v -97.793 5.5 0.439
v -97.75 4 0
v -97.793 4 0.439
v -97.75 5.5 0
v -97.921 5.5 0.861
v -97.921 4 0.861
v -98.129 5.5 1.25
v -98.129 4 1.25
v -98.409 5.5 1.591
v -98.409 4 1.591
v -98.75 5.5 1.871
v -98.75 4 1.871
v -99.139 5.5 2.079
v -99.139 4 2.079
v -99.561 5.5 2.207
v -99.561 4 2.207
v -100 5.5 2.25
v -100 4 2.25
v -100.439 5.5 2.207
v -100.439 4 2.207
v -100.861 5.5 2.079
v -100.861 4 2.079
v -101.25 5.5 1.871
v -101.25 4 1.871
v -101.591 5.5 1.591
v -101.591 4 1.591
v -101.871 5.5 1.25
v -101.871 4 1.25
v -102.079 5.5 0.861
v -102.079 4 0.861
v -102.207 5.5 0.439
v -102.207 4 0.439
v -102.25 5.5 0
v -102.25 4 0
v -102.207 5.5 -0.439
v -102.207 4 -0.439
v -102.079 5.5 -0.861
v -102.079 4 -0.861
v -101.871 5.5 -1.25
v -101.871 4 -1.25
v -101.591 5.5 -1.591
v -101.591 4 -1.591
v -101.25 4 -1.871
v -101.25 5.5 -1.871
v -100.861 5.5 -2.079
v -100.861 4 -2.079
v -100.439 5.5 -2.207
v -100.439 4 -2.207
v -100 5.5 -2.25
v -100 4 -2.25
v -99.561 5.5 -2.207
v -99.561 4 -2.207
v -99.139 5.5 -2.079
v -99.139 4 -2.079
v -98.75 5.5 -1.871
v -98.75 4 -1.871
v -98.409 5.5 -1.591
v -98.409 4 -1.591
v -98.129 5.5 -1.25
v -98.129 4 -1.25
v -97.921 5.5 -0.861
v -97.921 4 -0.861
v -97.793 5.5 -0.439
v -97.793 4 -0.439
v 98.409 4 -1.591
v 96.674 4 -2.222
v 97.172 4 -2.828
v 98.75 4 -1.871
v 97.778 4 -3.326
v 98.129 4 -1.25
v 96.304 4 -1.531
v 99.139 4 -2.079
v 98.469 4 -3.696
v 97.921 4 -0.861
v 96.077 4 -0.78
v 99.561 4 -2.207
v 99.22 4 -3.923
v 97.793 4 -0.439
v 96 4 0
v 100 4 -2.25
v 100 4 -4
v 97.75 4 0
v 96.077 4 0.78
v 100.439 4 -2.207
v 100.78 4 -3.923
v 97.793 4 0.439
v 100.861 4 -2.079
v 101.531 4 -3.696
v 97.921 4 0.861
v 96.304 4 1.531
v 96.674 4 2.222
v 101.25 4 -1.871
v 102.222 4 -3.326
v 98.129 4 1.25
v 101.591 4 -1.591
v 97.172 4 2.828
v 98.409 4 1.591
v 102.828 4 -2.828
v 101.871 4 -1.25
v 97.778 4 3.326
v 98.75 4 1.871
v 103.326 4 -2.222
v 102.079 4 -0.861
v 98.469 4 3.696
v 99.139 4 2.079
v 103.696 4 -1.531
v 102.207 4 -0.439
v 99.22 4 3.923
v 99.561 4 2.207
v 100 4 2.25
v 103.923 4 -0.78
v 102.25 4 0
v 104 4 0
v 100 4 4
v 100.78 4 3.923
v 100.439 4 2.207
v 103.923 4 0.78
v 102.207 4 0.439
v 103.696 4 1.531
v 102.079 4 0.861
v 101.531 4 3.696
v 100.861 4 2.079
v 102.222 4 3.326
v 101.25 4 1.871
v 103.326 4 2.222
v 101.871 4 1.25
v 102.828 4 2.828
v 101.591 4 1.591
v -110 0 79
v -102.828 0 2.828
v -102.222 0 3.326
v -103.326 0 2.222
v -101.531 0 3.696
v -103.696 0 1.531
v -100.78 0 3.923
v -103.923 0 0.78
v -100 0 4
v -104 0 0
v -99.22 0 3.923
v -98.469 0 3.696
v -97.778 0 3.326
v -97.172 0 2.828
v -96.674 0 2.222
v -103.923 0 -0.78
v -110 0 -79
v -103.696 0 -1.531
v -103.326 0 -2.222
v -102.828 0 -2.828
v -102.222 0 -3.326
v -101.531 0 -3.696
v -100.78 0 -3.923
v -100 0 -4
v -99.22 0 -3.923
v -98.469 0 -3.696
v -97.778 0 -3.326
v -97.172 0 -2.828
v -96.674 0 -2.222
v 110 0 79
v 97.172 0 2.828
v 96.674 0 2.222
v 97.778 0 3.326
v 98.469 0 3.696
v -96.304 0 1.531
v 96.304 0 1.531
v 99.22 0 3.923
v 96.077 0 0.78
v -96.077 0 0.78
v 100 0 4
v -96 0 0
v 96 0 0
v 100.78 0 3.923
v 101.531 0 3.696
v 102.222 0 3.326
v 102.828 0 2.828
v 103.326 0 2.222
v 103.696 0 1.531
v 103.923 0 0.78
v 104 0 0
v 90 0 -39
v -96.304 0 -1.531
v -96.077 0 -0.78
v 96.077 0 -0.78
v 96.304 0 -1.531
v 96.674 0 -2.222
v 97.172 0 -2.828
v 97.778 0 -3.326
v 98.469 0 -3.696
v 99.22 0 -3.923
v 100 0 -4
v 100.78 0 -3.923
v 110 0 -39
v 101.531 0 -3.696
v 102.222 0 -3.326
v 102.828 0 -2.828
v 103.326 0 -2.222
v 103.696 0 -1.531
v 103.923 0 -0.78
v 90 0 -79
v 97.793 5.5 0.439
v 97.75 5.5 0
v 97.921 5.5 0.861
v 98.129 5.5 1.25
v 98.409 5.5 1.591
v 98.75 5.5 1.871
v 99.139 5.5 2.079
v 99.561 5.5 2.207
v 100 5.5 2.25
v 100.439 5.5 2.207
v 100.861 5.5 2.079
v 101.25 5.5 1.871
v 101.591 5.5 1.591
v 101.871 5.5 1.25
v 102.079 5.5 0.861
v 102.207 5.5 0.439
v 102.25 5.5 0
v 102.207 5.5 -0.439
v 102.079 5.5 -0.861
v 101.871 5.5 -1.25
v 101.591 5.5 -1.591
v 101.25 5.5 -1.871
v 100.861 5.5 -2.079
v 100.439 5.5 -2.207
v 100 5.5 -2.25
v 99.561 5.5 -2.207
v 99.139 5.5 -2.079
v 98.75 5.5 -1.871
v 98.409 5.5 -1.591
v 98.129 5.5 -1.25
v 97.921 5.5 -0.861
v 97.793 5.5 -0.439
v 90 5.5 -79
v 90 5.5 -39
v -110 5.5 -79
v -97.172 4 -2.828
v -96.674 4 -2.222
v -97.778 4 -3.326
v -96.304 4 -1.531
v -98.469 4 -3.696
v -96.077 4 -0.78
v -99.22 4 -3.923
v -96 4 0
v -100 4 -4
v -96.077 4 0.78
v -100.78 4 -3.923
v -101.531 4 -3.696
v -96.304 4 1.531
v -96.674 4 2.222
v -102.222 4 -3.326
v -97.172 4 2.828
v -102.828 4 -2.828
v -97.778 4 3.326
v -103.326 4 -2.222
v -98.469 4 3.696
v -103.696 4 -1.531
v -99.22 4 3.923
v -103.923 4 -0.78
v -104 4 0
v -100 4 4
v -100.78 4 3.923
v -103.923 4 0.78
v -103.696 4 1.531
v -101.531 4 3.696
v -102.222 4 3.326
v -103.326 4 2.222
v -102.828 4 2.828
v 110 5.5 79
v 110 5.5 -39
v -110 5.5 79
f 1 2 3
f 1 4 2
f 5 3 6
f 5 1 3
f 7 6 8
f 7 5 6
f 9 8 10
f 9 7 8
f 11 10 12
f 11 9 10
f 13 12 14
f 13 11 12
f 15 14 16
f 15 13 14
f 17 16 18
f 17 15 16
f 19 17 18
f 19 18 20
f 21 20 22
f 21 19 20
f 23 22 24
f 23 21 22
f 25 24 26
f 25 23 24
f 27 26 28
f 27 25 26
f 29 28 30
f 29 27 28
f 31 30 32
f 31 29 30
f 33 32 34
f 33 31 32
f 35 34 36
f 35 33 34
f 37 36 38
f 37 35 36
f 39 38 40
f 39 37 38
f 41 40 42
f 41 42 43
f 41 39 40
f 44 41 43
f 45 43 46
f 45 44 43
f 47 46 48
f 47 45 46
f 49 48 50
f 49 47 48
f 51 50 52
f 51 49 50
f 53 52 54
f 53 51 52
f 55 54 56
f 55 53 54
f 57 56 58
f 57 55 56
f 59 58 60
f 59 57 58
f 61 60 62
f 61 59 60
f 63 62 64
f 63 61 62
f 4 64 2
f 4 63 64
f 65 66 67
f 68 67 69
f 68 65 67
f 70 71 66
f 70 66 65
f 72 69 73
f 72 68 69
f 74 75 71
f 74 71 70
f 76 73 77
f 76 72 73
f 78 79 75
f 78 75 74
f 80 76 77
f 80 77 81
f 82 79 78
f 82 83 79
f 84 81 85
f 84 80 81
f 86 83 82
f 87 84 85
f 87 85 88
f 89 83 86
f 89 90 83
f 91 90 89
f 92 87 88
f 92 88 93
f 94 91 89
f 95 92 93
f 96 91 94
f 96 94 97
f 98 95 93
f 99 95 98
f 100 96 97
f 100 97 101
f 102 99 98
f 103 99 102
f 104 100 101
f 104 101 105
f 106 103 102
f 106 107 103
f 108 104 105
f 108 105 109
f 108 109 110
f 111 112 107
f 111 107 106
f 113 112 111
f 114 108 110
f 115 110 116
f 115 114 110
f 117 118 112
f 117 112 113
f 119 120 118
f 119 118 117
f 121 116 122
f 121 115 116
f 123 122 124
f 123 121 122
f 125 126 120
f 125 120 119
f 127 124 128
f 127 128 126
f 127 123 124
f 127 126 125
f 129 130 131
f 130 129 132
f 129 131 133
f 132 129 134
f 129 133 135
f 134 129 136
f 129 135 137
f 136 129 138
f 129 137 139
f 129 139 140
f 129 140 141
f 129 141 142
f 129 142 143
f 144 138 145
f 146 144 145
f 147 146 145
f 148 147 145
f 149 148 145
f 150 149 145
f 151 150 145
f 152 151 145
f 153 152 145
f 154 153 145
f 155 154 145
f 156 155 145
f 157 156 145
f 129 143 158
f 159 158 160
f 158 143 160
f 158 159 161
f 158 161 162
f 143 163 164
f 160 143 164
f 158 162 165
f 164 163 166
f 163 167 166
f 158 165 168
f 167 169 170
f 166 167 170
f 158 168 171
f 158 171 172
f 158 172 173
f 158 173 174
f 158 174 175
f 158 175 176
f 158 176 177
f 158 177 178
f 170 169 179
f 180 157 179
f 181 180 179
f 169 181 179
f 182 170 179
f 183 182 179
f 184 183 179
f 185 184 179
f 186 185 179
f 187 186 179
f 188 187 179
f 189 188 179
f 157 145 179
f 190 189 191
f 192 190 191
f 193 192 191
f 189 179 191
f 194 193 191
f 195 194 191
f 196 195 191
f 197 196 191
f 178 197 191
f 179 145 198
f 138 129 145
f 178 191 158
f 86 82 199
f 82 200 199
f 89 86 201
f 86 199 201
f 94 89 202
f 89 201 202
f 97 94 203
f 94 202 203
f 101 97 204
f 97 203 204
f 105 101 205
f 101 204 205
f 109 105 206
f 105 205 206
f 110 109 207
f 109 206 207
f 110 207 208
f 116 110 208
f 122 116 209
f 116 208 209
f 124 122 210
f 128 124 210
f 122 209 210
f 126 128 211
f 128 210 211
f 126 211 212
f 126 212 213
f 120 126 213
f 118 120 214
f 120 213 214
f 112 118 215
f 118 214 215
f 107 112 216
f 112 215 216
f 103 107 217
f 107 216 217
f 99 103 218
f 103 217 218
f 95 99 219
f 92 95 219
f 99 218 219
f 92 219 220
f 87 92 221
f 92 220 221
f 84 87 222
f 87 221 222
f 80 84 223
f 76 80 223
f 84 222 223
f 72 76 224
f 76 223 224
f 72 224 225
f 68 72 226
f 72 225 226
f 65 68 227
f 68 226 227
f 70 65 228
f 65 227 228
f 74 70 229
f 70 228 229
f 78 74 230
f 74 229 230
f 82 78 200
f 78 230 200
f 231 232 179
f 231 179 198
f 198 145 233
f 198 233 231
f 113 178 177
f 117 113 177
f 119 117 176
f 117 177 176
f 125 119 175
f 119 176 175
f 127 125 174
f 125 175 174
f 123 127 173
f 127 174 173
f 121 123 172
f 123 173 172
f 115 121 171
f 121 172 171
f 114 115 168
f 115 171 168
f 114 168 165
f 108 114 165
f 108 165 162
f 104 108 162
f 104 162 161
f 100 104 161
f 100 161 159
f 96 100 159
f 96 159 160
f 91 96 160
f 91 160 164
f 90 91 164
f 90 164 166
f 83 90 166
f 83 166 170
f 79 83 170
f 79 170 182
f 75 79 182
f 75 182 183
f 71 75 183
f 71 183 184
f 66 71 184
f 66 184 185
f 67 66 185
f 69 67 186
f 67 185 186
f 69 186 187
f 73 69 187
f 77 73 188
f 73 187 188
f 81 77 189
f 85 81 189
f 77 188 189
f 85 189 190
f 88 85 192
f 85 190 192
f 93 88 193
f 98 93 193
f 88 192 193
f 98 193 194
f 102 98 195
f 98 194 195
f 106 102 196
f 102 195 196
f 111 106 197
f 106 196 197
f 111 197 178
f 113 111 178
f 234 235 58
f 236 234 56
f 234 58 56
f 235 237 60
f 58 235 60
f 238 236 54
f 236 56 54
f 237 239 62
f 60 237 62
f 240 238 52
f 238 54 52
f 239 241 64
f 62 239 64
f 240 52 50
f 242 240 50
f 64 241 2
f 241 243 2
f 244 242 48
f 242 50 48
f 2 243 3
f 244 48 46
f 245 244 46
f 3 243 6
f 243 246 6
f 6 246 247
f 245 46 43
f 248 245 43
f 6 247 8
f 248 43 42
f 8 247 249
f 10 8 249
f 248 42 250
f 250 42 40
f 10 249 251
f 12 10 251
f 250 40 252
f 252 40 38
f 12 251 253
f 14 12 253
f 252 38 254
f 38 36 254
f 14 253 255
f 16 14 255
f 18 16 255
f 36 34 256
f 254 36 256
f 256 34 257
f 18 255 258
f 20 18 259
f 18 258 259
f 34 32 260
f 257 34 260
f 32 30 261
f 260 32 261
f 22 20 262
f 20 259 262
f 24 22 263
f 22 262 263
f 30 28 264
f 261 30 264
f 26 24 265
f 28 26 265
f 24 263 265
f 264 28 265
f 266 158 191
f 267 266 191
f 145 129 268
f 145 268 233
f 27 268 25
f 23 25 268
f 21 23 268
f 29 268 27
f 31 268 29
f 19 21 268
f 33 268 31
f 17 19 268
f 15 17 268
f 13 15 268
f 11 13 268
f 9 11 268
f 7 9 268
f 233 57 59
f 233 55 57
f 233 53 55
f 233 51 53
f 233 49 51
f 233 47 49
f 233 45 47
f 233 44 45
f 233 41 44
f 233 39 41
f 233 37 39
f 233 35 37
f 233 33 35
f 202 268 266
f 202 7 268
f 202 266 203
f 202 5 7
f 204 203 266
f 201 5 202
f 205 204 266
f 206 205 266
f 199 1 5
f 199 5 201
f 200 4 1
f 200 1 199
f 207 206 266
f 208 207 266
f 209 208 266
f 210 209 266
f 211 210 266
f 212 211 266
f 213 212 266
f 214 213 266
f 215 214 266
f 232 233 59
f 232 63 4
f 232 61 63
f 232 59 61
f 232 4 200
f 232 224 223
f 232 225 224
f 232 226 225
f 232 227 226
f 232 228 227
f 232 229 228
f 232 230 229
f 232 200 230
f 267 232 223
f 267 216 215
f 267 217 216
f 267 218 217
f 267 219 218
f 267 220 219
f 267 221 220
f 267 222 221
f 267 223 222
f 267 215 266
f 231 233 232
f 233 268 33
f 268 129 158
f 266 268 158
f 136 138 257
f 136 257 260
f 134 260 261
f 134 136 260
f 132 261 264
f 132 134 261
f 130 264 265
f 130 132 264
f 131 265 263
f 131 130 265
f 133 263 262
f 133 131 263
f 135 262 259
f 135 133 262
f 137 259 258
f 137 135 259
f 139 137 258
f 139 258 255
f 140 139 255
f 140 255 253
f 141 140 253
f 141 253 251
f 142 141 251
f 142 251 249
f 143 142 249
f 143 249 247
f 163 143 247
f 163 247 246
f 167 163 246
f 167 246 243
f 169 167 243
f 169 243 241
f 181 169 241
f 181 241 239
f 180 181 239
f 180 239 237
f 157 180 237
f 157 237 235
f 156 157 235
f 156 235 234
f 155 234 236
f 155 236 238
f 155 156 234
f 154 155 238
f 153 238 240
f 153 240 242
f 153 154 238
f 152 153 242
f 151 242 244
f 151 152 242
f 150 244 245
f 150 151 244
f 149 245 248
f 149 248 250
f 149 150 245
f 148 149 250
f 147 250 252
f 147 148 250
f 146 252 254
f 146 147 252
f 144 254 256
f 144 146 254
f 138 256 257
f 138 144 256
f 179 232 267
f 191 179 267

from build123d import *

# Parameters (mm, degrees)
SKETCH1_W                      = 220
SKETCH1_H                      = 158
BOSS_EXTRUDE1_DEPTH            = 5.5
CBORE_FOR_M4_SHCS1_D           = 4.5
CBORE_FOR_M4_SHCS1_CBORE_D     = 8
CBORE_FOR_M4_SHCS1_CBORE_DEPTH = 4
SKETCH6_W                      = 20
SKETCH6_H                      = 40
CUT_EXTRUDE2_DEPTH             = 6.5


with BuildPart() as part:
    # Sketch1 → Boss-Extrude1 (new body)
    with BuildSketch(Plane(origin=(0, 0, 0), x_dir=(1, 0, 0), z_dir=(0, 1, 0))):
        Rectangle(SKETCH1_W, SKETCH1_H)
    extrude(amount=BOSS_EXTRUDE1_DEPTH)

    # CBORE for M4 SHCS1 (through all)
    with Locations(Plane.XZ):
        with Locations((100, 0)):
            cbore_for_m4_shcs1 = CounterBoreHole(CBORE_FOR_M4_SHCS1_D / 2, CBORE_FOR_M4_SHCS1_CBORE_D / 2, CBORE_FOR_M4_SHCS1_CBORE_DEPTH)

    # Mirror2: CBORE for M4 SHCS1 across plane
    add(cbore_for_m4_shcs1.mirror(Plane(origin=(0, 0, 0), x_dir=(0, 0, 1), z_dir=(1, 0, 0))), mode=Mode.SUBTRACT)

    # Sketch6 → Cut-Extrude2 (cut, through all)
    with BuildSketch(Plane(origin=(0, 5.5, 0), x_dir=(1, 0, 0), z_dir=(0, 1, 0))):
        with Locations((100, 59)):
            Rectangle(SKETCH6_W, SKETCH6_H)
    extrude(amount=-CUT_EXTRUDE2_DEPTH, mode=Mode.SUBTRACT)


solid = part.part
